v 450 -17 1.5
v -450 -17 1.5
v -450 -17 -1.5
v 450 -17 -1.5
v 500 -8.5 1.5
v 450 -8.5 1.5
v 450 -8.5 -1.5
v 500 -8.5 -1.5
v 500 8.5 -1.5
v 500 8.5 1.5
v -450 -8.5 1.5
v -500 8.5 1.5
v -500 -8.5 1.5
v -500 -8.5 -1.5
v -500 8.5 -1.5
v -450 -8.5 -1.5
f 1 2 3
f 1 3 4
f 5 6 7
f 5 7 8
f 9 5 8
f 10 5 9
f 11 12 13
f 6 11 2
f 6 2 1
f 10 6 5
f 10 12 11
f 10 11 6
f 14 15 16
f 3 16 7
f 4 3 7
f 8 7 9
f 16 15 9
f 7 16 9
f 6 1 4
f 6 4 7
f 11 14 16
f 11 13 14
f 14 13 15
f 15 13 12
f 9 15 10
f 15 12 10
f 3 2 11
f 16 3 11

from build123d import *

# Parameters (mm, degrees)
SKETCH2_W           = 900
SKETCH2_H           = 8.5
SKETCH2_W_2         = 1000
SKETCH2_H_2         = 17
BOSS_EXTRUDE1_DEPTH = 1.5


with BuildPart() as part:
    # Sketch2 → Boss-Extrude1 (new, symmetric)
    with BuildSketch(Plane.XY):
        with Locations((0, -12.75)):
            Rectangle(SKETCH2_W, SKETCH2_H)
        Rectangle(SKETCH2_W_2, SKETCH2_H_2)
    extrude(amount=BOSS_EXTRUDE1_DEPTH, both=True)


solid = part.part
